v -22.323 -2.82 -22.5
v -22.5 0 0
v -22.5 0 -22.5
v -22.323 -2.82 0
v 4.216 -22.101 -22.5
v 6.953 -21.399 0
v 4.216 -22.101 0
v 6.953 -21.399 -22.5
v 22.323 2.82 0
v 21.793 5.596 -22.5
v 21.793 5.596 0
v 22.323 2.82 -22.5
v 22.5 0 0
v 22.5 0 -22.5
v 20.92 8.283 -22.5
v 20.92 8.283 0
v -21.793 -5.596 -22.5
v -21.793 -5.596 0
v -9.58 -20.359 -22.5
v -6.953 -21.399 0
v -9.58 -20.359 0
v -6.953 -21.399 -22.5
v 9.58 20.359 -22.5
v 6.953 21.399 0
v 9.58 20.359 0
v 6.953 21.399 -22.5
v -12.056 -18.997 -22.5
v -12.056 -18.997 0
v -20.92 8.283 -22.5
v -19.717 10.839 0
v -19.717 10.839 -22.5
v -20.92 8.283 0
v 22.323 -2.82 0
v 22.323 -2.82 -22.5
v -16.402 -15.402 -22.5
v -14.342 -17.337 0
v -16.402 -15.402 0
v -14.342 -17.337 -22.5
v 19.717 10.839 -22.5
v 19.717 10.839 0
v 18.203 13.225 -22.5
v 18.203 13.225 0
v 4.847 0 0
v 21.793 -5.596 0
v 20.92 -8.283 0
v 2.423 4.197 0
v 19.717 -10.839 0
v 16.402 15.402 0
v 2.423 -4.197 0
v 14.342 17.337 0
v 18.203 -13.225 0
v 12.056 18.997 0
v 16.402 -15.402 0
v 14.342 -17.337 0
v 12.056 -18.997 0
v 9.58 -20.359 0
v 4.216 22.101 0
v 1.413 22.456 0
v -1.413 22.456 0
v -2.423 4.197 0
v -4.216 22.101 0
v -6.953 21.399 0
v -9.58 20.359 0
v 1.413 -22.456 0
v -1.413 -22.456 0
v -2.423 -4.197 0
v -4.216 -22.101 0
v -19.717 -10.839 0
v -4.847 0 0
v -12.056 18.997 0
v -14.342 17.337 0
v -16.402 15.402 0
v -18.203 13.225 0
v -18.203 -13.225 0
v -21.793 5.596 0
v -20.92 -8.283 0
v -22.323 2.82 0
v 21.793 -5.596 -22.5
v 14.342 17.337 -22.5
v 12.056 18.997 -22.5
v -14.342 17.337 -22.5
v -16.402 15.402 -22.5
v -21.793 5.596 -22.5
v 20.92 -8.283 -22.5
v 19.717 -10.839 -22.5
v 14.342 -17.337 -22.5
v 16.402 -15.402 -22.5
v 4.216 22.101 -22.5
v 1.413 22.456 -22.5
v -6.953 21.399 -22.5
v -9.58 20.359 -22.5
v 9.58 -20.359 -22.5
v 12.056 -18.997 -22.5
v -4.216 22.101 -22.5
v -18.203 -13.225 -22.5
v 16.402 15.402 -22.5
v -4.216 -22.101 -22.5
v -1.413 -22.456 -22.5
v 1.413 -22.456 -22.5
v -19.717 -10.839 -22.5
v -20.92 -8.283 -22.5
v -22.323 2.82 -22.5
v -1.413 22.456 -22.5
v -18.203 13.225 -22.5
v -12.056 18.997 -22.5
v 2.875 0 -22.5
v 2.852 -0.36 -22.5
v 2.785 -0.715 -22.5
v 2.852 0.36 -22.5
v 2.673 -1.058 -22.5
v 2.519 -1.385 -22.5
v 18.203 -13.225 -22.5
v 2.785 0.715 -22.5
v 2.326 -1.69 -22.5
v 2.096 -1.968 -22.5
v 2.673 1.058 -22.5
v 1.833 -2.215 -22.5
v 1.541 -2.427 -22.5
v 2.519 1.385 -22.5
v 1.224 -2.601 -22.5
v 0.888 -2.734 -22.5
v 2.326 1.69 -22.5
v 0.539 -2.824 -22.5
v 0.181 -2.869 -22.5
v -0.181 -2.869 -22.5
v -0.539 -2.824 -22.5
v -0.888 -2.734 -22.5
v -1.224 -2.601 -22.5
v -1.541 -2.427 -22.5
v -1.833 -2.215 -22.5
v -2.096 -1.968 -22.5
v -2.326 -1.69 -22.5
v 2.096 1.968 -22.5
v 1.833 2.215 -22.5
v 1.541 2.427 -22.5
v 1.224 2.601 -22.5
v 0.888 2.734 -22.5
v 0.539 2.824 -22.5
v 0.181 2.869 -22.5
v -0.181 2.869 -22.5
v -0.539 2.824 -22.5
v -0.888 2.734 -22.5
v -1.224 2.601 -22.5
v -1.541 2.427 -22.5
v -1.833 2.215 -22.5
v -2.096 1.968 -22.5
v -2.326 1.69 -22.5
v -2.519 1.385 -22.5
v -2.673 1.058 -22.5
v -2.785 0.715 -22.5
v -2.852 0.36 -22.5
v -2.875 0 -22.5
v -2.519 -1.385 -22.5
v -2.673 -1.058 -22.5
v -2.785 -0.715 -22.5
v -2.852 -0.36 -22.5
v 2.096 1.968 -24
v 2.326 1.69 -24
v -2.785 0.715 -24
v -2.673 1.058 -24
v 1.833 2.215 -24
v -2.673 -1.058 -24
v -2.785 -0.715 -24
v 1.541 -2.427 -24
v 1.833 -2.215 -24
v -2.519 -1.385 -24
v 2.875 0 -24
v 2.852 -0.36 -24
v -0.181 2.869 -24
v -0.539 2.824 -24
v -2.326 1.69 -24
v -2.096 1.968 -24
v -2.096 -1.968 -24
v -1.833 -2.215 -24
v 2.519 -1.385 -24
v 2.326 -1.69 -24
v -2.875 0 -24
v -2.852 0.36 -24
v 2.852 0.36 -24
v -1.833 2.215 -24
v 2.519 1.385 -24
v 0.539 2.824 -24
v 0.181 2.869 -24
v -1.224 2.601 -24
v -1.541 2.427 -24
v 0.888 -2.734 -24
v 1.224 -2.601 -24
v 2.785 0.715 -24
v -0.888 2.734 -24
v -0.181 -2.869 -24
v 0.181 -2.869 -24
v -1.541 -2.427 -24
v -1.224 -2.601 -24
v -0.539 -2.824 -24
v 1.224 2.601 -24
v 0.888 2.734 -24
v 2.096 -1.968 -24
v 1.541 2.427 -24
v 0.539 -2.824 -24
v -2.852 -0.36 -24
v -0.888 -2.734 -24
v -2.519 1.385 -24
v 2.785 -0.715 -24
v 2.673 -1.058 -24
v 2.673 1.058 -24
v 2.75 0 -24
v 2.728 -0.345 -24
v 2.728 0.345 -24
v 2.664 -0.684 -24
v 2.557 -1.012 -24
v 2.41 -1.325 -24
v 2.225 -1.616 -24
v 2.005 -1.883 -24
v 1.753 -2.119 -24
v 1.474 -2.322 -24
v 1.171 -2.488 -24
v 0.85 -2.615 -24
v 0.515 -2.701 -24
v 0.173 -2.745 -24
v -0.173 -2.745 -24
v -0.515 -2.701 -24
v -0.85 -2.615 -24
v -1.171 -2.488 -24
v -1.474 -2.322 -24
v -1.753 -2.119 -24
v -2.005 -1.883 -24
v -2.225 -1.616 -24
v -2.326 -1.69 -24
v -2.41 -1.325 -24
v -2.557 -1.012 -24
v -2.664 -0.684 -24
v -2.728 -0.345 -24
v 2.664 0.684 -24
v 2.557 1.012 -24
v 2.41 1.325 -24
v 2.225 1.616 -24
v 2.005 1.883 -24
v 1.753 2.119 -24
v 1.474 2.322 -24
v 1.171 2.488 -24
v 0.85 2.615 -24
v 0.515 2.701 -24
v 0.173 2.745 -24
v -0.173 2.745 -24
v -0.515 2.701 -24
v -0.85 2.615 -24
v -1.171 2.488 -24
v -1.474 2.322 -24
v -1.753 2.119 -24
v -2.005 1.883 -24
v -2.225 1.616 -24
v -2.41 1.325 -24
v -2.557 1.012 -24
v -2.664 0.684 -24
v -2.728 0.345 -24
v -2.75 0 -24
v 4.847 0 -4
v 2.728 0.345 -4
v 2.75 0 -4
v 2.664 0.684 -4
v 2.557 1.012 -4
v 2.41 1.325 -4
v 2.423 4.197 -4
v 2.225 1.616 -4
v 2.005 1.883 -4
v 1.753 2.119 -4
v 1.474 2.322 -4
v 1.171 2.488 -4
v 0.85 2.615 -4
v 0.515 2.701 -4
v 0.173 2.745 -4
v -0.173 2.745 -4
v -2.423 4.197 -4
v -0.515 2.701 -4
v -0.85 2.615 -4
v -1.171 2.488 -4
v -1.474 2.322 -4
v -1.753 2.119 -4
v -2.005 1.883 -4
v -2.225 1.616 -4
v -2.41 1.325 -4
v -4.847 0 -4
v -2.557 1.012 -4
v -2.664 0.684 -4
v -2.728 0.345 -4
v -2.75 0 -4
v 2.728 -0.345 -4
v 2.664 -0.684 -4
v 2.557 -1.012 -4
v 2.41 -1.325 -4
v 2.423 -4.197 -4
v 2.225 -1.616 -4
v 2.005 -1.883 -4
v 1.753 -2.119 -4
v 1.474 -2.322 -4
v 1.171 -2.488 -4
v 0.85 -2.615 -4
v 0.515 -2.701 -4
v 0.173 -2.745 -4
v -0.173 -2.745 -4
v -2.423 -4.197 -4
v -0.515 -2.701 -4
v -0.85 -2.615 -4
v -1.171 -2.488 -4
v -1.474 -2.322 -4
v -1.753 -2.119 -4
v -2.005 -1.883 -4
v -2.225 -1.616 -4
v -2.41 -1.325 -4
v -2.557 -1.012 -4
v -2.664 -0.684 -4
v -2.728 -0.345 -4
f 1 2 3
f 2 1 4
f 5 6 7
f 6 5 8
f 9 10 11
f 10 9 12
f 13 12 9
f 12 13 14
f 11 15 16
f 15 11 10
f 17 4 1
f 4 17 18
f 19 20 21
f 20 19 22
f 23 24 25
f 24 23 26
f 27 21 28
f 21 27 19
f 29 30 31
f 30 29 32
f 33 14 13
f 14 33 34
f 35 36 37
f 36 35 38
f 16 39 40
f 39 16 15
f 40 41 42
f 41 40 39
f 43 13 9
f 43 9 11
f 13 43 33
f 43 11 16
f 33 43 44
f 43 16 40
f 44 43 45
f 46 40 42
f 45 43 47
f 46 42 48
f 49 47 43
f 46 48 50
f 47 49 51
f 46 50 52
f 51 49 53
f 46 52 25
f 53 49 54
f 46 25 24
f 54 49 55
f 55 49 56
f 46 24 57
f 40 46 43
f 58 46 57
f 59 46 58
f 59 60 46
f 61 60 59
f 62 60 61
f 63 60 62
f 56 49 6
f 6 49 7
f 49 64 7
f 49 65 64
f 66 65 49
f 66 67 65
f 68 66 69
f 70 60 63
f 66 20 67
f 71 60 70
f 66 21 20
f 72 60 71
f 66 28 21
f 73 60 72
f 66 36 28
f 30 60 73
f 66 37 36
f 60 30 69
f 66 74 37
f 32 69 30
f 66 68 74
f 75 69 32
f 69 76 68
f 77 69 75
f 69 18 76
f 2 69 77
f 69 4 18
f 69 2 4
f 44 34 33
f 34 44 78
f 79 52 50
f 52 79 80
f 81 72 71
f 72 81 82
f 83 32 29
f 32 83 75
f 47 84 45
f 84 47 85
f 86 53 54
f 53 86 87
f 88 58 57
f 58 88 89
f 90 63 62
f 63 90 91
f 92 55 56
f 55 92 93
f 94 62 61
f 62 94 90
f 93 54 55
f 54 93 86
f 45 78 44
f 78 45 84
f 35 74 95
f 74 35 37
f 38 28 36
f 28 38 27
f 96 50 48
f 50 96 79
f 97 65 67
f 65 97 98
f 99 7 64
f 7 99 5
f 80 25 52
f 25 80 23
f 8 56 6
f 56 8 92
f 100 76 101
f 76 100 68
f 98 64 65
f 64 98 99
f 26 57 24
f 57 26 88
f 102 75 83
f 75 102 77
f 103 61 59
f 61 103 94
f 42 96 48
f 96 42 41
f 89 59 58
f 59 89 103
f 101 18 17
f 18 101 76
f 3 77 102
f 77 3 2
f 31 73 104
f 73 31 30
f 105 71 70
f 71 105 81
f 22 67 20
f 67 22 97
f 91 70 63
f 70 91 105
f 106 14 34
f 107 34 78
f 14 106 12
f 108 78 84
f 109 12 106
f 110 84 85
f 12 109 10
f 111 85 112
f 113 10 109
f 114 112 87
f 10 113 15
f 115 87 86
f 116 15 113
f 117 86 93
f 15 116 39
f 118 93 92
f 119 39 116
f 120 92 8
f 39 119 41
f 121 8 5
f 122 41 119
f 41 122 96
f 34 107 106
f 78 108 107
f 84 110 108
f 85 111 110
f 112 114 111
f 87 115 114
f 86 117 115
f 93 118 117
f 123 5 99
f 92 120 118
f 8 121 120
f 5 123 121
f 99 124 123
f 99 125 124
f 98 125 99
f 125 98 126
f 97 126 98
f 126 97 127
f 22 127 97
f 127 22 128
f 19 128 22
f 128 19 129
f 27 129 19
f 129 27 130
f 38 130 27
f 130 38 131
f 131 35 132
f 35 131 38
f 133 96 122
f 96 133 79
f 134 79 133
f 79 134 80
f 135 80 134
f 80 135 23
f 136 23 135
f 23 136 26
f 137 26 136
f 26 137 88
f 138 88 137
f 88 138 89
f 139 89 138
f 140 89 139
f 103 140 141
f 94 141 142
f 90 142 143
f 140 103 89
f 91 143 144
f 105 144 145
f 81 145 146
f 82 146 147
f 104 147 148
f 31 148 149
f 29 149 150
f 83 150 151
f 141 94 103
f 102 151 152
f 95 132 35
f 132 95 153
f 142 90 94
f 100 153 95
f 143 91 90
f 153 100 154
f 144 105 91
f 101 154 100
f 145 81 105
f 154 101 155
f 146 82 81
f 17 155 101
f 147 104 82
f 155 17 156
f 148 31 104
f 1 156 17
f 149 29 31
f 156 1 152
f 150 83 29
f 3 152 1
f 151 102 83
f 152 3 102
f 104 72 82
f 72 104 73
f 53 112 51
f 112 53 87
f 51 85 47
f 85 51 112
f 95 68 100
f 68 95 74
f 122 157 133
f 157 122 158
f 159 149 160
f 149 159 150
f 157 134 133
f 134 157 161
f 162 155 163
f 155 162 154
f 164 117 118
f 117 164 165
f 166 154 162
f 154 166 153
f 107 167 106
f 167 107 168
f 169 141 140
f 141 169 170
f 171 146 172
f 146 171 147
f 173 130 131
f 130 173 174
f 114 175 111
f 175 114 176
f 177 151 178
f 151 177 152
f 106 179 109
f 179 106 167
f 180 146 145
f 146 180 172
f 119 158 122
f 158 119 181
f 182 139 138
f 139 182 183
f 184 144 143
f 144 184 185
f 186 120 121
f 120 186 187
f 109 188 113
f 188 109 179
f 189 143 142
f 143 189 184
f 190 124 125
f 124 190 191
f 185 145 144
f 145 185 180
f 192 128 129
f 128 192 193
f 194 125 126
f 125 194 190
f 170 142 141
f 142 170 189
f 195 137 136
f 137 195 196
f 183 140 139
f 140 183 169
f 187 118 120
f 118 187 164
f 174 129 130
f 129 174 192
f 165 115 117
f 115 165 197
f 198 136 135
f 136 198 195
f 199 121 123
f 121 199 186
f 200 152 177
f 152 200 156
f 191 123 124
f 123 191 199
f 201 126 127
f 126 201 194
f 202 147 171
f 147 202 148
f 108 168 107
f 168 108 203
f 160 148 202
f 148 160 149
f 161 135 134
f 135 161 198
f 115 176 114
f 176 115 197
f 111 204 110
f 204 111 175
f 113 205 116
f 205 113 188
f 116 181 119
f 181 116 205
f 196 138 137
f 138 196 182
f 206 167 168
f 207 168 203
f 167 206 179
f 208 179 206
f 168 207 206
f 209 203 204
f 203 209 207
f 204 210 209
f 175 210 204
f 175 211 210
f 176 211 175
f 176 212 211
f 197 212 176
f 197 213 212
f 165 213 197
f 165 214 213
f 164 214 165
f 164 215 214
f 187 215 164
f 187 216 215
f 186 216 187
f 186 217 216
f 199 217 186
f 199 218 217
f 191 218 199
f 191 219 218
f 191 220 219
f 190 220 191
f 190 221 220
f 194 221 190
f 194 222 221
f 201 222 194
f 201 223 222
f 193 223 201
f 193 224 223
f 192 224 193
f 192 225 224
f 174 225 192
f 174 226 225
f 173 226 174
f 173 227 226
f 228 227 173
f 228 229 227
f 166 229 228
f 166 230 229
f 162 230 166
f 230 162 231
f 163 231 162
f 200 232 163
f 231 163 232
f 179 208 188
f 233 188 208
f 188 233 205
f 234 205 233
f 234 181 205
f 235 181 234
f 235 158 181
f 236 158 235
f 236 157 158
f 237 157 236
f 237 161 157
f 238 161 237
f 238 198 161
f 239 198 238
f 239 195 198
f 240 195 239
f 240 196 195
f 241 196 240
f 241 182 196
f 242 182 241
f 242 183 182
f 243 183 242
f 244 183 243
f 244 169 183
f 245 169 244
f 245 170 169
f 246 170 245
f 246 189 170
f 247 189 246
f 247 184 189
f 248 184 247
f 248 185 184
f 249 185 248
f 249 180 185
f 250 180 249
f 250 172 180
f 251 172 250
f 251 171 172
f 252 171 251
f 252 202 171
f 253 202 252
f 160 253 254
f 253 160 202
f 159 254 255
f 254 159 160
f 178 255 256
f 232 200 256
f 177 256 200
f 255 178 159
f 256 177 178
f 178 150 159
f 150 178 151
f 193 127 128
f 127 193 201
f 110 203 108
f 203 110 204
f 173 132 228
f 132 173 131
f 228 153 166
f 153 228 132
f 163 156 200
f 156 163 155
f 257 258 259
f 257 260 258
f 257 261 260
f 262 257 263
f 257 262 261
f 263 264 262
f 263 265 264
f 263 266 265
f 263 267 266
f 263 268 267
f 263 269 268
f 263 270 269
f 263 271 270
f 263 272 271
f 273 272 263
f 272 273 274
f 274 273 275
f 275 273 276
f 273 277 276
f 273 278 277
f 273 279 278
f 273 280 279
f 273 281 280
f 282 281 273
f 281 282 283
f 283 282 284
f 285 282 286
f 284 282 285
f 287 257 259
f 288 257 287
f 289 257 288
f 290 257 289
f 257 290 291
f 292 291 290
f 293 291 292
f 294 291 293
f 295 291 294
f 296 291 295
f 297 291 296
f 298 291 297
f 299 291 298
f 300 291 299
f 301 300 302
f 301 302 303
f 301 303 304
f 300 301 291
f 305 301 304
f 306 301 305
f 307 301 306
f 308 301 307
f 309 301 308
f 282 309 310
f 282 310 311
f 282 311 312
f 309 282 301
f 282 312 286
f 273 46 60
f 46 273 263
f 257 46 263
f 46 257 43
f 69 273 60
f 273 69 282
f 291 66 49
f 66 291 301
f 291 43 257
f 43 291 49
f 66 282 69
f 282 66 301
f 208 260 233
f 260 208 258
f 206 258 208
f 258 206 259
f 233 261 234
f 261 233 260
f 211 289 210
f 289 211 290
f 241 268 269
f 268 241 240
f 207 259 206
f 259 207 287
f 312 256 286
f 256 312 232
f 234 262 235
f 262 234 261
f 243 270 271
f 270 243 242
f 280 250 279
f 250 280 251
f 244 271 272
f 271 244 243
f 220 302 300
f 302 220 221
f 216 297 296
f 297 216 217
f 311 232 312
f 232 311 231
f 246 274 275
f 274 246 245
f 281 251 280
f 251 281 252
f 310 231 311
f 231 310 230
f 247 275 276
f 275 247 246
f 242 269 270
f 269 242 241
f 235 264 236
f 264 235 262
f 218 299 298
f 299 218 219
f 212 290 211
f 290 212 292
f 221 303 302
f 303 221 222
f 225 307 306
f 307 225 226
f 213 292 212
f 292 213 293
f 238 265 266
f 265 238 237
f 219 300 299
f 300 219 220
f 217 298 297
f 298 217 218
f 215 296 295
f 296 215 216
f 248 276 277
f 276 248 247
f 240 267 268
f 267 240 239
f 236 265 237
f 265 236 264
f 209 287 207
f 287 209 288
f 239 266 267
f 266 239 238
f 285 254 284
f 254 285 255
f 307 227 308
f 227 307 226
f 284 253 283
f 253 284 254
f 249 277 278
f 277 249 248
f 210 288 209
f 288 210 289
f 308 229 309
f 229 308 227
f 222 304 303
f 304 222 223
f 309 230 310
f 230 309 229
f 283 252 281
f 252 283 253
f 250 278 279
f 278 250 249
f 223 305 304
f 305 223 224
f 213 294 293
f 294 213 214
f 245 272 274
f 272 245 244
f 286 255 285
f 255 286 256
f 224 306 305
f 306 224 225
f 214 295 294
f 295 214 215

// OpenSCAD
$fn = 50;


difference() {
	union() {
		translate(v = [0, 0, -22.5000000000]) {
			cylinder(h = 22.5000000000, r = 22.5000000000);
		}
		#translate(v = [0, 0, -24.0000000000]) {
			cylinder(h = 24, r = 2.8750000000);
		}
	}
	union() {
		translate(v = [0, 0, 0]) {
			rotate(a = [0, 0, 0]) {
				difference() {
					union() {
						translate(v = [0, 0, -4]) {
							linear_extrude(height = 4) {
								polygon(points = [[4.8468000000, 0.0000000000], [2.4234000000, 4.1974519271], [-2.4234000000, 4.1974519271], [-4.8468000000, 0.0000000000], [-2.4234000000, -4.1974519271], [2.4234000000, -4.1974519271]]);
							}
						}
					}
					union();
				}
			}
		}
		#translate(v = [0, 0, -100.0000000000]) {
			cylinder(h = 200, r = 2.7500000000);
		}
	}
}
